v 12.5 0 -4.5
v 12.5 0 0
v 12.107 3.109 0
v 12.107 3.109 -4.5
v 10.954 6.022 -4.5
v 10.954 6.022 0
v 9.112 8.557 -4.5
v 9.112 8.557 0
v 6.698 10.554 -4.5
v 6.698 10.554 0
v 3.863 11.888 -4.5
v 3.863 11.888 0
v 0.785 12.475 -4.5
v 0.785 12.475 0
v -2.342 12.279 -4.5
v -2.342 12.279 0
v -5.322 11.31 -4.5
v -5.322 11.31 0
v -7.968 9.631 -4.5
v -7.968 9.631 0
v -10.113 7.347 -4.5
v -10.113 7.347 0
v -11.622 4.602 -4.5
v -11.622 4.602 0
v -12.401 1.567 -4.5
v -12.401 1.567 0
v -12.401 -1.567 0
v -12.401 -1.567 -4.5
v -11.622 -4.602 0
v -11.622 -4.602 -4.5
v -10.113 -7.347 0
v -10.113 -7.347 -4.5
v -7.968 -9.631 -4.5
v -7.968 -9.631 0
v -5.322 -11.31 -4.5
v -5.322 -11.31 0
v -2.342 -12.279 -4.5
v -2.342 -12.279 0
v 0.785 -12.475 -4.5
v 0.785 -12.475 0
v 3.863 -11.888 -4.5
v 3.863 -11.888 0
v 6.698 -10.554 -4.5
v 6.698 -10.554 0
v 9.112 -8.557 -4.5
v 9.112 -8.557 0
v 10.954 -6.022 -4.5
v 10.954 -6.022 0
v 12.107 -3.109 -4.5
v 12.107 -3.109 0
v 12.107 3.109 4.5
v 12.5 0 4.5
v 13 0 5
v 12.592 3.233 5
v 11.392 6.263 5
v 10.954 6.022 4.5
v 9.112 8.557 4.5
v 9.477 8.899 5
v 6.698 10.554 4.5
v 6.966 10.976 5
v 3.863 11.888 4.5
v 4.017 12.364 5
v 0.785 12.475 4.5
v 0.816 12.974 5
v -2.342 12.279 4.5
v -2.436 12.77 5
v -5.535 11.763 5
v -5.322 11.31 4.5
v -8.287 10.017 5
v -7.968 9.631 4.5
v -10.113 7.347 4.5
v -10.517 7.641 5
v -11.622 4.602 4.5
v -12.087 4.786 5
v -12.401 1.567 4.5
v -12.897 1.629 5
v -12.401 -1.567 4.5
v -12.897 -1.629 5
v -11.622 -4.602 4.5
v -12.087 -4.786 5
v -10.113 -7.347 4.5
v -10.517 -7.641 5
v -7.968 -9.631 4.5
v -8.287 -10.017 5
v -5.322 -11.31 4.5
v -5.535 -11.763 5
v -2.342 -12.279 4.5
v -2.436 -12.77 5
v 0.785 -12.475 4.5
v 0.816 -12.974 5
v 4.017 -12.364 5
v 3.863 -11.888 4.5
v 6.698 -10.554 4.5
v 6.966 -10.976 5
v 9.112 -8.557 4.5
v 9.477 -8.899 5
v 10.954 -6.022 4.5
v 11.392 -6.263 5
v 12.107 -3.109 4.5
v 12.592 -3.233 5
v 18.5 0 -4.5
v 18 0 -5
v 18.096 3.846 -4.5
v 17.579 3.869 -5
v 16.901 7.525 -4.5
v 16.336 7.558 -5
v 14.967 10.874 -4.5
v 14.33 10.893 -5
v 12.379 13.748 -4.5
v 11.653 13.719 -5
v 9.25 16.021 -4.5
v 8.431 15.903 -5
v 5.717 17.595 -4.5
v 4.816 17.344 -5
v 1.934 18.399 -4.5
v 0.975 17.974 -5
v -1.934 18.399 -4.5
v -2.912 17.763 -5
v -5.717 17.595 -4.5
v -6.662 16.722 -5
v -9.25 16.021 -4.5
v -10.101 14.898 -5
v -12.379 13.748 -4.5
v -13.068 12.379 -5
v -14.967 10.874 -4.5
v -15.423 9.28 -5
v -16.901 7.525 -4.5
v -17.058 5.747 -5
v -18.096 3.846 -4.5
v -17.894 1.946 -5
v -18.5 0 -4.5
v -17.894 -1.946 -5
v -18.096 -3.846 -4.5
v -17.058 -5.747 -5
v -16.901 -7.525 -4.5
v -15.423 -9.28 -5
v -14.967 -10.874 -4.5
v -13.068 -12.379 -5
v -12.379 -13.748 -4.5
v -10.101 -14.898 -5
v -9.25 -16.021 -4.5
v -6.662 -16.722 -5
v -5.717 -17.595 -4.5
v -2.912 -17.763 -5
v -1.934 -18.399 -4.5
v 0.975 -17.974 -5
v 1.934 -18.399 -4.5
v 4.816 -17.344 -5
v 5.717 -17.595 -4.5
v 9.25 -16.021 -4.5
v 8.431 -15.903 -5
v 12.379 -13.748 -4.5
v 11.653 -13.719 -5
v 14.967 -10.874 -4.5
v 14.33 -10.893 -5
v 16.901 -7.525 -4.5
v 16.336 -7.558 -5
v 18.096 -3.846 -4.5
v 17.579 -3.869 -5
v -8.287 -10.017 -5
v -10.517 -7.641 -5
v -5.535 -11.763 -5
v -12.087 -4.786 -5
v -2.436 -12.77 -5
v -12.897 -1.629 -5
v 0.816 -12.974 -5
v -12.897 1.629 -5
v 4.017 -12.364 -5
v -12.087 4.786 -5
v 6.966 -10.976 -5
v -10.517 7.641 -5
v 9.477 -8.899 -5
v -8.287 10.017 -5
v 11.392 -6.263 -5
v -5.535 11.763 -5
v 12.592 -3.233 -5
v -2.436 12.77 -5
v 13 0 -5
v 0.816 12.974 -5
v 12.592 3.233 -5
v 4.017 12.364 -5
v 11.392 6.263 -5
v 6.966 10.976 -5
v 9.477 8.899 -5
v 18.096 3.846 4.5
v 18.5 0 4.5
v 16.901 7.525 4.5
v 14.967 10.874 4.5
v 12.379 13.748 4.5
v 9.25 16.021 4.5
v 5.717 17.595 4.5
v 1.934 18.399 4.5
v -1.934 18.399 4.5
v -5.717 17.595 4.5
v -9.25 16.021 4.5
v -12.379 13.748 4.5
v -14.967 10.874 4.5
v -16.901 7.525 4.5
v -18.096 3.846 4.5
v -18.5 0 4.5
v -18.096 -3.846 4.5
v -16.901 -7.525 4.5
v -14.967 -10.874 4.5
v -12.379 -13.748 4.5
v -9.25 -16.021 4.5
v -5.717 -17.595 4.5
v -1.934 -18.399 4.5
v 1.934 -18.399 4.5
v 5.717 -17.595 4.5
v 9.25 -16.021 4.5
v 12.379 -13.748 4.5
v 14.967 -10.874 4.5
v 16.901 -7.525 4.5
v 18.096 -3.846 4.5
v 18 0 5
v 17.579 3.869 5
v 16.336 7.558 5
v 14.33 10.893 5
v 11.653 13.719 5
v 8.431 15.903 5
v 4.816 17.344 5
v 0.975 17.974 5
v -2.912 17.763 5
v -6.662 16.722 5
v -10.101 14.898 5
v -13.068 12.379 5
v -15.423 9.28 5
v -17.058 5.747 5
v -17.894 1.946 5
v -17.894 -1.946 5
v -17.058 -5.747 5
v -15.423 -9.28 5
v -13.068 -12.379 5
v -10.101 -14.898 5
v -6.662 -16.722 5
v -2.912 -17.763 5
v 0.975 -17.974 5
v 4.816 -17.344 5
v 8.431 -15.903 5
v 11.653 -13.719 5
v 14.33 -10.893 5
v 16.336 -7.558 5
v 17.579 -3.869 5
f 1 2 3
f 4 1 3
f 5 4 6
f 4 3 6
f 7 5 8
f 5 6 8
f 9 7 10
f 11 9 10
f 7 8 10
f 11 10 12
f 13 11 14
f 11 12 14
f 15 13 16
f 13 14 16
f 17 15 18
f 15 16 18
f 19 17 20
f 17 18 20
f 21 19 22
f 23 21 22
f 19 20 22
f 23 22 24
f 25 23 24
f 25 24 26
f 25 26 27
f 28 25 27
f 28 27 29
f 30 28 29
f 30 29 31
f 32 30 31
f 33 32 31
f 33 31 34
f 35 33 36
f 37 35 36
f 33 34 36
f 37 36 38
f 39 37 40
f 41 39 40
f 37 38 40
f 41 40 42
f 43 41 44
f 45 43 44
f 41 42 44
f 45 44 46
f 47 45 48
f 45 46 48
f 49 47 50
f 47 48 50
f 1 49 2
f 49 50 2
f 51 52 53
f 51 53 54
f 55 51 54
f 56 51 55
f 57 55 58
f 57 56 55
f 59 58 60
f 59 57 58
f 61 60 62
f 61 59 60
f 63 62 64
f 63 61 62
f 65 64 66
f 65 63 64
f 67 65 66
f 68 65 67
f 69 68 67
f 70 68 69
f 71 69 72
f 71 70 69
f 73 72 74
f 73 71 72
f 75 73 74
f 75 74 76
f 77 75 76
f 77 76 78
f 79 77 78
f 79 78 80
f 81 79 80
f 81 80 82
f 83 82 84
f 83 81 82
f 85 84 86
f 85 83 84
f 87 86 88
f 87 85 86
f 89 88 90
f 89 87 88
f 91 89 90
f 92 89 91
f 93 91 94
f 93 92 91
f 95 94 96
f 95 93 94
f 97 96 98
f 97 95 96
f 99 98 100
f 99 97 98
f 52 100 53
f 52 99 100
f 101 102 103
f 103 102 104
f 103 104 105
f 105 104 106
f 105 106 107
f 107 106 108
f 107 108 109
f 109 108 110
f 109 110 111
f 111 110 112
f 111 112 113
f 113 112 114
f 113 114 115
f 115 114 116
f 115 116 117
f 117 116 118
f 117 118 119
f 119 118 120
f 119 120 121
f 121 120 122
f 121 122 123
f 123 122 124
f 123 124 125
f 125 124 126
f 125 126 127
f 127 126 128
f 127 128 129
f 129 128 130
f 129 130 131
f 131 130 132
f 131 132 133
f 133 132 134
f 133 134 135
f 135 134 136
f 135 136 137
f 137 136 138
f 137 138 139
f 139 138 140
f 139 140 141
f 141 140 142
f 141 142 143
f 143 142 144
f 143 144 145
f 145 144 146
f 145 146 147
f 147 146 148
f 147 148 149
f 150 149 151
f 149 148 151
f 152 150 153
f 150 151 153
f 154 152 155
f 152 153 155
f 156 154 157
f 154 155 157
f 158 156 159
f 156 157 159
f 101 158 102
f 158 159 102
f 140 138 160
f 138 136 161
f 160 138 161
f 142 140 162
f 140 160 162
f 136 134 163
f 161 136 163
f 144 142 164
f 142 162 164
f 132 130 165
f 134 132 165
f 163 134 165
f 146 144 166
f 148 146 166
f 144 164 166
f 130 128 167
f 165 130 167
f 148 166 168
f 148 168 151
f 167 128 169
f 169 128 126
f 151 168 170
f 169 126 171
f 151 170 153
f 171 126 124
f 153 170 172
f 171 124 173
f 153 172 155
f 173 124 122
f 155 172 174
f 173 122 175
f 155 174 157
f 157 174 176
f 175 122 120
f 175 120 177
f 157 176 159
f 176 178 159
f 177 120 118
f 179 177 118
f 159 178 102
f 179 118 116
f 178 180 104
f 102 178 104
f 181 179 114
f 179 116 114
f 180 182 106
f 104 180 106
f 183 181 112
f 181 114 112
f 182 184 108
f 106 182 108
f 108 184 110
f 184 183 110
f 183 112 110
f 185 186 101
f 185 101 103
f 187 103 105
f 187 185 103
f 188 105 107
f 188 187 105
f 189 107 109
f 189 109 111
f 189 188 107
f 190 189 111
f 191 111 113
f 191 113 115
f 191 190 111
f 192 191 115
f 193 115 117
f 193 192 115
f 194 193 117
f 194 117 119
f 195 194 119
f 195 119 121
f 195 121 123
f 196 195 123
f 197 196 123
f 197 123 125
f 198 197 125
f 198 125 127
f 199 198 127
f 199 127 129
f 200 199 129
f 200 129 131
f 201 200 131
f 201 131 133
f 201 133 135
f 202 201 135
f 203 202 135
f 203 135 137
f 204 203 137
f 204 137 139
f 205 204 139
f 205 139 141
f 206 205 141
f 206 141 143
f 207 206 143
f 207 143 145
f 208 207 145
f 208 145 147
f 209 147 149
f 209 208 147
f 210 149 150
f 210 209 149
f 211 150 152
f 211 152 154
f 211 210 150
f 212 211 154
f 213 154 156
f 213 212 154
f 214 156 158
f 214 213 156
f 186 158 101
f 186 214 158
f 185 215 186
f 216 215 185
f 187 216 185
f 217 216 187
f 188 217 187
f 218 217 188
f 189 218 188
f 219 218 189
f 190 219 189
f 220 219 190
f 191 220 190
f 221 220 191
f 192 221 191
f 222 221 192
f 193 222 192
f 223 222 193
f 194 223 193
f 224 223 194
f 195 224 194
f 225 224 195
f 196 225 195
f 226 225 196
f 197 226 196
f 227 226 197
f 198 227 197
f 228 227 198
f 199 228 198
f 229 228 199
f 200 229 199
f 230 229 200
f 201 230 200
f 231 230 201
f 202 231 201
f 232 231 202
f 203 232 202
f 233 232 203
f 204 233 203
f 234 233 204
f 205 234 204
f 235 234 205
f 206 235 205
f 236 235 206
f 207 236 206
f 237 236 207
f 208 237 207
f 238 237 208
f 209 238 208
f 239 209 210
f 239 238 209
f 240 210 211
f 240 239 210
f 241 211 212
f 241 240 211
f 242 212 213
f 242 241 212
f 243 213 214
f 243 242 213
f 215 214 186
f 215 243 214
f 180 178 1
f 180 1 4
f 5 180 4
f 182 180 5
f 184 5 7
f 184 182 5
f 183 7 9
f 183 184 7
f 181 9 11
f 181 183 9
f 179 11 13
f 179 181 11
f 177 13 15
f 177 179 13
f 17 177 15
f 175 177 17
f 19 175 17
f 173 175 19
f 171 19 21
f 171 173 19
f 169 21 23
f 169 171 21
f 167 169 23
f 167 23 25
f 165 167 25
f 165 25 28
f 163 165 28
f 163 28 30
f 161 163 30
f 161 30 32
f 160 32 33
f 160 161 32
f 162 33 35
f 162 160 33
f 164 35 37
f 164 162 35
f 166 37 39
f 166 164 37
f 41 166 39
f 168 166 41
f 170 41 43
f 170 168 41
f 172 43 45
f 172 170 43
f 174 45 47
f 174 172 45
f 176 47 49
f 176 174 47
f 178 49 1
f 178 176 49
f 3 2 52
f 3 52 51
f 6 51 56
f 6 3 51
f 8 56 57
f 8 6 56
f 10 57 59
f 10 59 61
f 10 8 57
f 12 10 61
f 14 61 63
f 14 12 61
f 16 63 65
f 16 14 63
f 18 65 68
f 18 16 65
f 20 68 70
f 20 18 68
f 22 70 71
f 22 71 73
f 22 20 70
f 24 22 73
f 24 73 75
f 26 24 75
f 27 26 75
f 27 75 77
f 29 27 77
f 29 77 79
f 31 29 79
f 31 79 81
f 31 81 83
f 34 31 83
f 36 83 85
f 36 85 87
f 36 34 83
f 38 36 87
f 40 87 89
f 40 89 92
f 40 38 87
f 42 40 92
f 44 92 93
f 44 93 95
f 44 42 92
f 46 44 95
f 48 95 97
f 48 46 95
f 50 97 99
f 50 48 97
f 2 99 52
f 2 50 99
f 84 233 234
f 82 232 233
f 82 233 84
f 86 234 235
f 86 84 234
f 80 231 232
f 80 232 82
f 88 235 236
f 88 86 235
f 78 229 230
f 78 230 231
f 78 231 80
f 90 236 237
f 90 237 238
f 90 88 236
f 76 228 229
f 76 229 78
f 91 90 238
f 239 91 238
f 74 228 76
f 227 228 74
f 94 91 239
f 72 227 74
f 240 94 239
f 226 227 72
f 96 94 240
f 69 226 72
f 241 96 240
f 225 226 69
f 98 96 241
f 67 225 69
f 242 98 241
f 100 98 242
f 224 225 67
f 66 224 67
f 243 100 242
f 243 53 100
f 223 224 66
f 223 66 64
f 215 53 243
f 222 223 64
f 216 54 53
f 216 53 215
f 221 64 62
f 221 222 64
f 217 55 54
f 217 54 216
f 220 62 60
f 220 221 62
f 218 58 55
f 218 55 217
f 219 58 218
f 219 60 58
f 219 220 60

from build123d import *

# Parameters (mm, degrees)
F0_R          = 18.5
F0_R_2        = 12.5
F1_DEPTH      = 5
F1_DEPTH_BACK = 5
F2_SIZE       = 0.5


with BuildPart() as f1:
    # F0 (on Top) → F1 (new body, two sides)
    with BuildSketch(Plane.XY) as f1_sk:
        Circle(F0_R)
        Circle(F0_R_2, mode=Mode.SUBTRACT)
    extrude(amount=F1_DEPTH)
    extrude(f1_sk.sketch, amount=-F1_DEPTH_BACK)

    # F2
    f2_edges = [f1.edges().sort_by_distance(p)[0] for p in [
        (-12.5, 0, -5),
        (-18.5, 0, -5),
        (-12.5, 0, 5),
        (-18.5, 0, 5),
    ]]
    chamfer(f2_edges, length=F2_SIZE)


solid = f1.part
